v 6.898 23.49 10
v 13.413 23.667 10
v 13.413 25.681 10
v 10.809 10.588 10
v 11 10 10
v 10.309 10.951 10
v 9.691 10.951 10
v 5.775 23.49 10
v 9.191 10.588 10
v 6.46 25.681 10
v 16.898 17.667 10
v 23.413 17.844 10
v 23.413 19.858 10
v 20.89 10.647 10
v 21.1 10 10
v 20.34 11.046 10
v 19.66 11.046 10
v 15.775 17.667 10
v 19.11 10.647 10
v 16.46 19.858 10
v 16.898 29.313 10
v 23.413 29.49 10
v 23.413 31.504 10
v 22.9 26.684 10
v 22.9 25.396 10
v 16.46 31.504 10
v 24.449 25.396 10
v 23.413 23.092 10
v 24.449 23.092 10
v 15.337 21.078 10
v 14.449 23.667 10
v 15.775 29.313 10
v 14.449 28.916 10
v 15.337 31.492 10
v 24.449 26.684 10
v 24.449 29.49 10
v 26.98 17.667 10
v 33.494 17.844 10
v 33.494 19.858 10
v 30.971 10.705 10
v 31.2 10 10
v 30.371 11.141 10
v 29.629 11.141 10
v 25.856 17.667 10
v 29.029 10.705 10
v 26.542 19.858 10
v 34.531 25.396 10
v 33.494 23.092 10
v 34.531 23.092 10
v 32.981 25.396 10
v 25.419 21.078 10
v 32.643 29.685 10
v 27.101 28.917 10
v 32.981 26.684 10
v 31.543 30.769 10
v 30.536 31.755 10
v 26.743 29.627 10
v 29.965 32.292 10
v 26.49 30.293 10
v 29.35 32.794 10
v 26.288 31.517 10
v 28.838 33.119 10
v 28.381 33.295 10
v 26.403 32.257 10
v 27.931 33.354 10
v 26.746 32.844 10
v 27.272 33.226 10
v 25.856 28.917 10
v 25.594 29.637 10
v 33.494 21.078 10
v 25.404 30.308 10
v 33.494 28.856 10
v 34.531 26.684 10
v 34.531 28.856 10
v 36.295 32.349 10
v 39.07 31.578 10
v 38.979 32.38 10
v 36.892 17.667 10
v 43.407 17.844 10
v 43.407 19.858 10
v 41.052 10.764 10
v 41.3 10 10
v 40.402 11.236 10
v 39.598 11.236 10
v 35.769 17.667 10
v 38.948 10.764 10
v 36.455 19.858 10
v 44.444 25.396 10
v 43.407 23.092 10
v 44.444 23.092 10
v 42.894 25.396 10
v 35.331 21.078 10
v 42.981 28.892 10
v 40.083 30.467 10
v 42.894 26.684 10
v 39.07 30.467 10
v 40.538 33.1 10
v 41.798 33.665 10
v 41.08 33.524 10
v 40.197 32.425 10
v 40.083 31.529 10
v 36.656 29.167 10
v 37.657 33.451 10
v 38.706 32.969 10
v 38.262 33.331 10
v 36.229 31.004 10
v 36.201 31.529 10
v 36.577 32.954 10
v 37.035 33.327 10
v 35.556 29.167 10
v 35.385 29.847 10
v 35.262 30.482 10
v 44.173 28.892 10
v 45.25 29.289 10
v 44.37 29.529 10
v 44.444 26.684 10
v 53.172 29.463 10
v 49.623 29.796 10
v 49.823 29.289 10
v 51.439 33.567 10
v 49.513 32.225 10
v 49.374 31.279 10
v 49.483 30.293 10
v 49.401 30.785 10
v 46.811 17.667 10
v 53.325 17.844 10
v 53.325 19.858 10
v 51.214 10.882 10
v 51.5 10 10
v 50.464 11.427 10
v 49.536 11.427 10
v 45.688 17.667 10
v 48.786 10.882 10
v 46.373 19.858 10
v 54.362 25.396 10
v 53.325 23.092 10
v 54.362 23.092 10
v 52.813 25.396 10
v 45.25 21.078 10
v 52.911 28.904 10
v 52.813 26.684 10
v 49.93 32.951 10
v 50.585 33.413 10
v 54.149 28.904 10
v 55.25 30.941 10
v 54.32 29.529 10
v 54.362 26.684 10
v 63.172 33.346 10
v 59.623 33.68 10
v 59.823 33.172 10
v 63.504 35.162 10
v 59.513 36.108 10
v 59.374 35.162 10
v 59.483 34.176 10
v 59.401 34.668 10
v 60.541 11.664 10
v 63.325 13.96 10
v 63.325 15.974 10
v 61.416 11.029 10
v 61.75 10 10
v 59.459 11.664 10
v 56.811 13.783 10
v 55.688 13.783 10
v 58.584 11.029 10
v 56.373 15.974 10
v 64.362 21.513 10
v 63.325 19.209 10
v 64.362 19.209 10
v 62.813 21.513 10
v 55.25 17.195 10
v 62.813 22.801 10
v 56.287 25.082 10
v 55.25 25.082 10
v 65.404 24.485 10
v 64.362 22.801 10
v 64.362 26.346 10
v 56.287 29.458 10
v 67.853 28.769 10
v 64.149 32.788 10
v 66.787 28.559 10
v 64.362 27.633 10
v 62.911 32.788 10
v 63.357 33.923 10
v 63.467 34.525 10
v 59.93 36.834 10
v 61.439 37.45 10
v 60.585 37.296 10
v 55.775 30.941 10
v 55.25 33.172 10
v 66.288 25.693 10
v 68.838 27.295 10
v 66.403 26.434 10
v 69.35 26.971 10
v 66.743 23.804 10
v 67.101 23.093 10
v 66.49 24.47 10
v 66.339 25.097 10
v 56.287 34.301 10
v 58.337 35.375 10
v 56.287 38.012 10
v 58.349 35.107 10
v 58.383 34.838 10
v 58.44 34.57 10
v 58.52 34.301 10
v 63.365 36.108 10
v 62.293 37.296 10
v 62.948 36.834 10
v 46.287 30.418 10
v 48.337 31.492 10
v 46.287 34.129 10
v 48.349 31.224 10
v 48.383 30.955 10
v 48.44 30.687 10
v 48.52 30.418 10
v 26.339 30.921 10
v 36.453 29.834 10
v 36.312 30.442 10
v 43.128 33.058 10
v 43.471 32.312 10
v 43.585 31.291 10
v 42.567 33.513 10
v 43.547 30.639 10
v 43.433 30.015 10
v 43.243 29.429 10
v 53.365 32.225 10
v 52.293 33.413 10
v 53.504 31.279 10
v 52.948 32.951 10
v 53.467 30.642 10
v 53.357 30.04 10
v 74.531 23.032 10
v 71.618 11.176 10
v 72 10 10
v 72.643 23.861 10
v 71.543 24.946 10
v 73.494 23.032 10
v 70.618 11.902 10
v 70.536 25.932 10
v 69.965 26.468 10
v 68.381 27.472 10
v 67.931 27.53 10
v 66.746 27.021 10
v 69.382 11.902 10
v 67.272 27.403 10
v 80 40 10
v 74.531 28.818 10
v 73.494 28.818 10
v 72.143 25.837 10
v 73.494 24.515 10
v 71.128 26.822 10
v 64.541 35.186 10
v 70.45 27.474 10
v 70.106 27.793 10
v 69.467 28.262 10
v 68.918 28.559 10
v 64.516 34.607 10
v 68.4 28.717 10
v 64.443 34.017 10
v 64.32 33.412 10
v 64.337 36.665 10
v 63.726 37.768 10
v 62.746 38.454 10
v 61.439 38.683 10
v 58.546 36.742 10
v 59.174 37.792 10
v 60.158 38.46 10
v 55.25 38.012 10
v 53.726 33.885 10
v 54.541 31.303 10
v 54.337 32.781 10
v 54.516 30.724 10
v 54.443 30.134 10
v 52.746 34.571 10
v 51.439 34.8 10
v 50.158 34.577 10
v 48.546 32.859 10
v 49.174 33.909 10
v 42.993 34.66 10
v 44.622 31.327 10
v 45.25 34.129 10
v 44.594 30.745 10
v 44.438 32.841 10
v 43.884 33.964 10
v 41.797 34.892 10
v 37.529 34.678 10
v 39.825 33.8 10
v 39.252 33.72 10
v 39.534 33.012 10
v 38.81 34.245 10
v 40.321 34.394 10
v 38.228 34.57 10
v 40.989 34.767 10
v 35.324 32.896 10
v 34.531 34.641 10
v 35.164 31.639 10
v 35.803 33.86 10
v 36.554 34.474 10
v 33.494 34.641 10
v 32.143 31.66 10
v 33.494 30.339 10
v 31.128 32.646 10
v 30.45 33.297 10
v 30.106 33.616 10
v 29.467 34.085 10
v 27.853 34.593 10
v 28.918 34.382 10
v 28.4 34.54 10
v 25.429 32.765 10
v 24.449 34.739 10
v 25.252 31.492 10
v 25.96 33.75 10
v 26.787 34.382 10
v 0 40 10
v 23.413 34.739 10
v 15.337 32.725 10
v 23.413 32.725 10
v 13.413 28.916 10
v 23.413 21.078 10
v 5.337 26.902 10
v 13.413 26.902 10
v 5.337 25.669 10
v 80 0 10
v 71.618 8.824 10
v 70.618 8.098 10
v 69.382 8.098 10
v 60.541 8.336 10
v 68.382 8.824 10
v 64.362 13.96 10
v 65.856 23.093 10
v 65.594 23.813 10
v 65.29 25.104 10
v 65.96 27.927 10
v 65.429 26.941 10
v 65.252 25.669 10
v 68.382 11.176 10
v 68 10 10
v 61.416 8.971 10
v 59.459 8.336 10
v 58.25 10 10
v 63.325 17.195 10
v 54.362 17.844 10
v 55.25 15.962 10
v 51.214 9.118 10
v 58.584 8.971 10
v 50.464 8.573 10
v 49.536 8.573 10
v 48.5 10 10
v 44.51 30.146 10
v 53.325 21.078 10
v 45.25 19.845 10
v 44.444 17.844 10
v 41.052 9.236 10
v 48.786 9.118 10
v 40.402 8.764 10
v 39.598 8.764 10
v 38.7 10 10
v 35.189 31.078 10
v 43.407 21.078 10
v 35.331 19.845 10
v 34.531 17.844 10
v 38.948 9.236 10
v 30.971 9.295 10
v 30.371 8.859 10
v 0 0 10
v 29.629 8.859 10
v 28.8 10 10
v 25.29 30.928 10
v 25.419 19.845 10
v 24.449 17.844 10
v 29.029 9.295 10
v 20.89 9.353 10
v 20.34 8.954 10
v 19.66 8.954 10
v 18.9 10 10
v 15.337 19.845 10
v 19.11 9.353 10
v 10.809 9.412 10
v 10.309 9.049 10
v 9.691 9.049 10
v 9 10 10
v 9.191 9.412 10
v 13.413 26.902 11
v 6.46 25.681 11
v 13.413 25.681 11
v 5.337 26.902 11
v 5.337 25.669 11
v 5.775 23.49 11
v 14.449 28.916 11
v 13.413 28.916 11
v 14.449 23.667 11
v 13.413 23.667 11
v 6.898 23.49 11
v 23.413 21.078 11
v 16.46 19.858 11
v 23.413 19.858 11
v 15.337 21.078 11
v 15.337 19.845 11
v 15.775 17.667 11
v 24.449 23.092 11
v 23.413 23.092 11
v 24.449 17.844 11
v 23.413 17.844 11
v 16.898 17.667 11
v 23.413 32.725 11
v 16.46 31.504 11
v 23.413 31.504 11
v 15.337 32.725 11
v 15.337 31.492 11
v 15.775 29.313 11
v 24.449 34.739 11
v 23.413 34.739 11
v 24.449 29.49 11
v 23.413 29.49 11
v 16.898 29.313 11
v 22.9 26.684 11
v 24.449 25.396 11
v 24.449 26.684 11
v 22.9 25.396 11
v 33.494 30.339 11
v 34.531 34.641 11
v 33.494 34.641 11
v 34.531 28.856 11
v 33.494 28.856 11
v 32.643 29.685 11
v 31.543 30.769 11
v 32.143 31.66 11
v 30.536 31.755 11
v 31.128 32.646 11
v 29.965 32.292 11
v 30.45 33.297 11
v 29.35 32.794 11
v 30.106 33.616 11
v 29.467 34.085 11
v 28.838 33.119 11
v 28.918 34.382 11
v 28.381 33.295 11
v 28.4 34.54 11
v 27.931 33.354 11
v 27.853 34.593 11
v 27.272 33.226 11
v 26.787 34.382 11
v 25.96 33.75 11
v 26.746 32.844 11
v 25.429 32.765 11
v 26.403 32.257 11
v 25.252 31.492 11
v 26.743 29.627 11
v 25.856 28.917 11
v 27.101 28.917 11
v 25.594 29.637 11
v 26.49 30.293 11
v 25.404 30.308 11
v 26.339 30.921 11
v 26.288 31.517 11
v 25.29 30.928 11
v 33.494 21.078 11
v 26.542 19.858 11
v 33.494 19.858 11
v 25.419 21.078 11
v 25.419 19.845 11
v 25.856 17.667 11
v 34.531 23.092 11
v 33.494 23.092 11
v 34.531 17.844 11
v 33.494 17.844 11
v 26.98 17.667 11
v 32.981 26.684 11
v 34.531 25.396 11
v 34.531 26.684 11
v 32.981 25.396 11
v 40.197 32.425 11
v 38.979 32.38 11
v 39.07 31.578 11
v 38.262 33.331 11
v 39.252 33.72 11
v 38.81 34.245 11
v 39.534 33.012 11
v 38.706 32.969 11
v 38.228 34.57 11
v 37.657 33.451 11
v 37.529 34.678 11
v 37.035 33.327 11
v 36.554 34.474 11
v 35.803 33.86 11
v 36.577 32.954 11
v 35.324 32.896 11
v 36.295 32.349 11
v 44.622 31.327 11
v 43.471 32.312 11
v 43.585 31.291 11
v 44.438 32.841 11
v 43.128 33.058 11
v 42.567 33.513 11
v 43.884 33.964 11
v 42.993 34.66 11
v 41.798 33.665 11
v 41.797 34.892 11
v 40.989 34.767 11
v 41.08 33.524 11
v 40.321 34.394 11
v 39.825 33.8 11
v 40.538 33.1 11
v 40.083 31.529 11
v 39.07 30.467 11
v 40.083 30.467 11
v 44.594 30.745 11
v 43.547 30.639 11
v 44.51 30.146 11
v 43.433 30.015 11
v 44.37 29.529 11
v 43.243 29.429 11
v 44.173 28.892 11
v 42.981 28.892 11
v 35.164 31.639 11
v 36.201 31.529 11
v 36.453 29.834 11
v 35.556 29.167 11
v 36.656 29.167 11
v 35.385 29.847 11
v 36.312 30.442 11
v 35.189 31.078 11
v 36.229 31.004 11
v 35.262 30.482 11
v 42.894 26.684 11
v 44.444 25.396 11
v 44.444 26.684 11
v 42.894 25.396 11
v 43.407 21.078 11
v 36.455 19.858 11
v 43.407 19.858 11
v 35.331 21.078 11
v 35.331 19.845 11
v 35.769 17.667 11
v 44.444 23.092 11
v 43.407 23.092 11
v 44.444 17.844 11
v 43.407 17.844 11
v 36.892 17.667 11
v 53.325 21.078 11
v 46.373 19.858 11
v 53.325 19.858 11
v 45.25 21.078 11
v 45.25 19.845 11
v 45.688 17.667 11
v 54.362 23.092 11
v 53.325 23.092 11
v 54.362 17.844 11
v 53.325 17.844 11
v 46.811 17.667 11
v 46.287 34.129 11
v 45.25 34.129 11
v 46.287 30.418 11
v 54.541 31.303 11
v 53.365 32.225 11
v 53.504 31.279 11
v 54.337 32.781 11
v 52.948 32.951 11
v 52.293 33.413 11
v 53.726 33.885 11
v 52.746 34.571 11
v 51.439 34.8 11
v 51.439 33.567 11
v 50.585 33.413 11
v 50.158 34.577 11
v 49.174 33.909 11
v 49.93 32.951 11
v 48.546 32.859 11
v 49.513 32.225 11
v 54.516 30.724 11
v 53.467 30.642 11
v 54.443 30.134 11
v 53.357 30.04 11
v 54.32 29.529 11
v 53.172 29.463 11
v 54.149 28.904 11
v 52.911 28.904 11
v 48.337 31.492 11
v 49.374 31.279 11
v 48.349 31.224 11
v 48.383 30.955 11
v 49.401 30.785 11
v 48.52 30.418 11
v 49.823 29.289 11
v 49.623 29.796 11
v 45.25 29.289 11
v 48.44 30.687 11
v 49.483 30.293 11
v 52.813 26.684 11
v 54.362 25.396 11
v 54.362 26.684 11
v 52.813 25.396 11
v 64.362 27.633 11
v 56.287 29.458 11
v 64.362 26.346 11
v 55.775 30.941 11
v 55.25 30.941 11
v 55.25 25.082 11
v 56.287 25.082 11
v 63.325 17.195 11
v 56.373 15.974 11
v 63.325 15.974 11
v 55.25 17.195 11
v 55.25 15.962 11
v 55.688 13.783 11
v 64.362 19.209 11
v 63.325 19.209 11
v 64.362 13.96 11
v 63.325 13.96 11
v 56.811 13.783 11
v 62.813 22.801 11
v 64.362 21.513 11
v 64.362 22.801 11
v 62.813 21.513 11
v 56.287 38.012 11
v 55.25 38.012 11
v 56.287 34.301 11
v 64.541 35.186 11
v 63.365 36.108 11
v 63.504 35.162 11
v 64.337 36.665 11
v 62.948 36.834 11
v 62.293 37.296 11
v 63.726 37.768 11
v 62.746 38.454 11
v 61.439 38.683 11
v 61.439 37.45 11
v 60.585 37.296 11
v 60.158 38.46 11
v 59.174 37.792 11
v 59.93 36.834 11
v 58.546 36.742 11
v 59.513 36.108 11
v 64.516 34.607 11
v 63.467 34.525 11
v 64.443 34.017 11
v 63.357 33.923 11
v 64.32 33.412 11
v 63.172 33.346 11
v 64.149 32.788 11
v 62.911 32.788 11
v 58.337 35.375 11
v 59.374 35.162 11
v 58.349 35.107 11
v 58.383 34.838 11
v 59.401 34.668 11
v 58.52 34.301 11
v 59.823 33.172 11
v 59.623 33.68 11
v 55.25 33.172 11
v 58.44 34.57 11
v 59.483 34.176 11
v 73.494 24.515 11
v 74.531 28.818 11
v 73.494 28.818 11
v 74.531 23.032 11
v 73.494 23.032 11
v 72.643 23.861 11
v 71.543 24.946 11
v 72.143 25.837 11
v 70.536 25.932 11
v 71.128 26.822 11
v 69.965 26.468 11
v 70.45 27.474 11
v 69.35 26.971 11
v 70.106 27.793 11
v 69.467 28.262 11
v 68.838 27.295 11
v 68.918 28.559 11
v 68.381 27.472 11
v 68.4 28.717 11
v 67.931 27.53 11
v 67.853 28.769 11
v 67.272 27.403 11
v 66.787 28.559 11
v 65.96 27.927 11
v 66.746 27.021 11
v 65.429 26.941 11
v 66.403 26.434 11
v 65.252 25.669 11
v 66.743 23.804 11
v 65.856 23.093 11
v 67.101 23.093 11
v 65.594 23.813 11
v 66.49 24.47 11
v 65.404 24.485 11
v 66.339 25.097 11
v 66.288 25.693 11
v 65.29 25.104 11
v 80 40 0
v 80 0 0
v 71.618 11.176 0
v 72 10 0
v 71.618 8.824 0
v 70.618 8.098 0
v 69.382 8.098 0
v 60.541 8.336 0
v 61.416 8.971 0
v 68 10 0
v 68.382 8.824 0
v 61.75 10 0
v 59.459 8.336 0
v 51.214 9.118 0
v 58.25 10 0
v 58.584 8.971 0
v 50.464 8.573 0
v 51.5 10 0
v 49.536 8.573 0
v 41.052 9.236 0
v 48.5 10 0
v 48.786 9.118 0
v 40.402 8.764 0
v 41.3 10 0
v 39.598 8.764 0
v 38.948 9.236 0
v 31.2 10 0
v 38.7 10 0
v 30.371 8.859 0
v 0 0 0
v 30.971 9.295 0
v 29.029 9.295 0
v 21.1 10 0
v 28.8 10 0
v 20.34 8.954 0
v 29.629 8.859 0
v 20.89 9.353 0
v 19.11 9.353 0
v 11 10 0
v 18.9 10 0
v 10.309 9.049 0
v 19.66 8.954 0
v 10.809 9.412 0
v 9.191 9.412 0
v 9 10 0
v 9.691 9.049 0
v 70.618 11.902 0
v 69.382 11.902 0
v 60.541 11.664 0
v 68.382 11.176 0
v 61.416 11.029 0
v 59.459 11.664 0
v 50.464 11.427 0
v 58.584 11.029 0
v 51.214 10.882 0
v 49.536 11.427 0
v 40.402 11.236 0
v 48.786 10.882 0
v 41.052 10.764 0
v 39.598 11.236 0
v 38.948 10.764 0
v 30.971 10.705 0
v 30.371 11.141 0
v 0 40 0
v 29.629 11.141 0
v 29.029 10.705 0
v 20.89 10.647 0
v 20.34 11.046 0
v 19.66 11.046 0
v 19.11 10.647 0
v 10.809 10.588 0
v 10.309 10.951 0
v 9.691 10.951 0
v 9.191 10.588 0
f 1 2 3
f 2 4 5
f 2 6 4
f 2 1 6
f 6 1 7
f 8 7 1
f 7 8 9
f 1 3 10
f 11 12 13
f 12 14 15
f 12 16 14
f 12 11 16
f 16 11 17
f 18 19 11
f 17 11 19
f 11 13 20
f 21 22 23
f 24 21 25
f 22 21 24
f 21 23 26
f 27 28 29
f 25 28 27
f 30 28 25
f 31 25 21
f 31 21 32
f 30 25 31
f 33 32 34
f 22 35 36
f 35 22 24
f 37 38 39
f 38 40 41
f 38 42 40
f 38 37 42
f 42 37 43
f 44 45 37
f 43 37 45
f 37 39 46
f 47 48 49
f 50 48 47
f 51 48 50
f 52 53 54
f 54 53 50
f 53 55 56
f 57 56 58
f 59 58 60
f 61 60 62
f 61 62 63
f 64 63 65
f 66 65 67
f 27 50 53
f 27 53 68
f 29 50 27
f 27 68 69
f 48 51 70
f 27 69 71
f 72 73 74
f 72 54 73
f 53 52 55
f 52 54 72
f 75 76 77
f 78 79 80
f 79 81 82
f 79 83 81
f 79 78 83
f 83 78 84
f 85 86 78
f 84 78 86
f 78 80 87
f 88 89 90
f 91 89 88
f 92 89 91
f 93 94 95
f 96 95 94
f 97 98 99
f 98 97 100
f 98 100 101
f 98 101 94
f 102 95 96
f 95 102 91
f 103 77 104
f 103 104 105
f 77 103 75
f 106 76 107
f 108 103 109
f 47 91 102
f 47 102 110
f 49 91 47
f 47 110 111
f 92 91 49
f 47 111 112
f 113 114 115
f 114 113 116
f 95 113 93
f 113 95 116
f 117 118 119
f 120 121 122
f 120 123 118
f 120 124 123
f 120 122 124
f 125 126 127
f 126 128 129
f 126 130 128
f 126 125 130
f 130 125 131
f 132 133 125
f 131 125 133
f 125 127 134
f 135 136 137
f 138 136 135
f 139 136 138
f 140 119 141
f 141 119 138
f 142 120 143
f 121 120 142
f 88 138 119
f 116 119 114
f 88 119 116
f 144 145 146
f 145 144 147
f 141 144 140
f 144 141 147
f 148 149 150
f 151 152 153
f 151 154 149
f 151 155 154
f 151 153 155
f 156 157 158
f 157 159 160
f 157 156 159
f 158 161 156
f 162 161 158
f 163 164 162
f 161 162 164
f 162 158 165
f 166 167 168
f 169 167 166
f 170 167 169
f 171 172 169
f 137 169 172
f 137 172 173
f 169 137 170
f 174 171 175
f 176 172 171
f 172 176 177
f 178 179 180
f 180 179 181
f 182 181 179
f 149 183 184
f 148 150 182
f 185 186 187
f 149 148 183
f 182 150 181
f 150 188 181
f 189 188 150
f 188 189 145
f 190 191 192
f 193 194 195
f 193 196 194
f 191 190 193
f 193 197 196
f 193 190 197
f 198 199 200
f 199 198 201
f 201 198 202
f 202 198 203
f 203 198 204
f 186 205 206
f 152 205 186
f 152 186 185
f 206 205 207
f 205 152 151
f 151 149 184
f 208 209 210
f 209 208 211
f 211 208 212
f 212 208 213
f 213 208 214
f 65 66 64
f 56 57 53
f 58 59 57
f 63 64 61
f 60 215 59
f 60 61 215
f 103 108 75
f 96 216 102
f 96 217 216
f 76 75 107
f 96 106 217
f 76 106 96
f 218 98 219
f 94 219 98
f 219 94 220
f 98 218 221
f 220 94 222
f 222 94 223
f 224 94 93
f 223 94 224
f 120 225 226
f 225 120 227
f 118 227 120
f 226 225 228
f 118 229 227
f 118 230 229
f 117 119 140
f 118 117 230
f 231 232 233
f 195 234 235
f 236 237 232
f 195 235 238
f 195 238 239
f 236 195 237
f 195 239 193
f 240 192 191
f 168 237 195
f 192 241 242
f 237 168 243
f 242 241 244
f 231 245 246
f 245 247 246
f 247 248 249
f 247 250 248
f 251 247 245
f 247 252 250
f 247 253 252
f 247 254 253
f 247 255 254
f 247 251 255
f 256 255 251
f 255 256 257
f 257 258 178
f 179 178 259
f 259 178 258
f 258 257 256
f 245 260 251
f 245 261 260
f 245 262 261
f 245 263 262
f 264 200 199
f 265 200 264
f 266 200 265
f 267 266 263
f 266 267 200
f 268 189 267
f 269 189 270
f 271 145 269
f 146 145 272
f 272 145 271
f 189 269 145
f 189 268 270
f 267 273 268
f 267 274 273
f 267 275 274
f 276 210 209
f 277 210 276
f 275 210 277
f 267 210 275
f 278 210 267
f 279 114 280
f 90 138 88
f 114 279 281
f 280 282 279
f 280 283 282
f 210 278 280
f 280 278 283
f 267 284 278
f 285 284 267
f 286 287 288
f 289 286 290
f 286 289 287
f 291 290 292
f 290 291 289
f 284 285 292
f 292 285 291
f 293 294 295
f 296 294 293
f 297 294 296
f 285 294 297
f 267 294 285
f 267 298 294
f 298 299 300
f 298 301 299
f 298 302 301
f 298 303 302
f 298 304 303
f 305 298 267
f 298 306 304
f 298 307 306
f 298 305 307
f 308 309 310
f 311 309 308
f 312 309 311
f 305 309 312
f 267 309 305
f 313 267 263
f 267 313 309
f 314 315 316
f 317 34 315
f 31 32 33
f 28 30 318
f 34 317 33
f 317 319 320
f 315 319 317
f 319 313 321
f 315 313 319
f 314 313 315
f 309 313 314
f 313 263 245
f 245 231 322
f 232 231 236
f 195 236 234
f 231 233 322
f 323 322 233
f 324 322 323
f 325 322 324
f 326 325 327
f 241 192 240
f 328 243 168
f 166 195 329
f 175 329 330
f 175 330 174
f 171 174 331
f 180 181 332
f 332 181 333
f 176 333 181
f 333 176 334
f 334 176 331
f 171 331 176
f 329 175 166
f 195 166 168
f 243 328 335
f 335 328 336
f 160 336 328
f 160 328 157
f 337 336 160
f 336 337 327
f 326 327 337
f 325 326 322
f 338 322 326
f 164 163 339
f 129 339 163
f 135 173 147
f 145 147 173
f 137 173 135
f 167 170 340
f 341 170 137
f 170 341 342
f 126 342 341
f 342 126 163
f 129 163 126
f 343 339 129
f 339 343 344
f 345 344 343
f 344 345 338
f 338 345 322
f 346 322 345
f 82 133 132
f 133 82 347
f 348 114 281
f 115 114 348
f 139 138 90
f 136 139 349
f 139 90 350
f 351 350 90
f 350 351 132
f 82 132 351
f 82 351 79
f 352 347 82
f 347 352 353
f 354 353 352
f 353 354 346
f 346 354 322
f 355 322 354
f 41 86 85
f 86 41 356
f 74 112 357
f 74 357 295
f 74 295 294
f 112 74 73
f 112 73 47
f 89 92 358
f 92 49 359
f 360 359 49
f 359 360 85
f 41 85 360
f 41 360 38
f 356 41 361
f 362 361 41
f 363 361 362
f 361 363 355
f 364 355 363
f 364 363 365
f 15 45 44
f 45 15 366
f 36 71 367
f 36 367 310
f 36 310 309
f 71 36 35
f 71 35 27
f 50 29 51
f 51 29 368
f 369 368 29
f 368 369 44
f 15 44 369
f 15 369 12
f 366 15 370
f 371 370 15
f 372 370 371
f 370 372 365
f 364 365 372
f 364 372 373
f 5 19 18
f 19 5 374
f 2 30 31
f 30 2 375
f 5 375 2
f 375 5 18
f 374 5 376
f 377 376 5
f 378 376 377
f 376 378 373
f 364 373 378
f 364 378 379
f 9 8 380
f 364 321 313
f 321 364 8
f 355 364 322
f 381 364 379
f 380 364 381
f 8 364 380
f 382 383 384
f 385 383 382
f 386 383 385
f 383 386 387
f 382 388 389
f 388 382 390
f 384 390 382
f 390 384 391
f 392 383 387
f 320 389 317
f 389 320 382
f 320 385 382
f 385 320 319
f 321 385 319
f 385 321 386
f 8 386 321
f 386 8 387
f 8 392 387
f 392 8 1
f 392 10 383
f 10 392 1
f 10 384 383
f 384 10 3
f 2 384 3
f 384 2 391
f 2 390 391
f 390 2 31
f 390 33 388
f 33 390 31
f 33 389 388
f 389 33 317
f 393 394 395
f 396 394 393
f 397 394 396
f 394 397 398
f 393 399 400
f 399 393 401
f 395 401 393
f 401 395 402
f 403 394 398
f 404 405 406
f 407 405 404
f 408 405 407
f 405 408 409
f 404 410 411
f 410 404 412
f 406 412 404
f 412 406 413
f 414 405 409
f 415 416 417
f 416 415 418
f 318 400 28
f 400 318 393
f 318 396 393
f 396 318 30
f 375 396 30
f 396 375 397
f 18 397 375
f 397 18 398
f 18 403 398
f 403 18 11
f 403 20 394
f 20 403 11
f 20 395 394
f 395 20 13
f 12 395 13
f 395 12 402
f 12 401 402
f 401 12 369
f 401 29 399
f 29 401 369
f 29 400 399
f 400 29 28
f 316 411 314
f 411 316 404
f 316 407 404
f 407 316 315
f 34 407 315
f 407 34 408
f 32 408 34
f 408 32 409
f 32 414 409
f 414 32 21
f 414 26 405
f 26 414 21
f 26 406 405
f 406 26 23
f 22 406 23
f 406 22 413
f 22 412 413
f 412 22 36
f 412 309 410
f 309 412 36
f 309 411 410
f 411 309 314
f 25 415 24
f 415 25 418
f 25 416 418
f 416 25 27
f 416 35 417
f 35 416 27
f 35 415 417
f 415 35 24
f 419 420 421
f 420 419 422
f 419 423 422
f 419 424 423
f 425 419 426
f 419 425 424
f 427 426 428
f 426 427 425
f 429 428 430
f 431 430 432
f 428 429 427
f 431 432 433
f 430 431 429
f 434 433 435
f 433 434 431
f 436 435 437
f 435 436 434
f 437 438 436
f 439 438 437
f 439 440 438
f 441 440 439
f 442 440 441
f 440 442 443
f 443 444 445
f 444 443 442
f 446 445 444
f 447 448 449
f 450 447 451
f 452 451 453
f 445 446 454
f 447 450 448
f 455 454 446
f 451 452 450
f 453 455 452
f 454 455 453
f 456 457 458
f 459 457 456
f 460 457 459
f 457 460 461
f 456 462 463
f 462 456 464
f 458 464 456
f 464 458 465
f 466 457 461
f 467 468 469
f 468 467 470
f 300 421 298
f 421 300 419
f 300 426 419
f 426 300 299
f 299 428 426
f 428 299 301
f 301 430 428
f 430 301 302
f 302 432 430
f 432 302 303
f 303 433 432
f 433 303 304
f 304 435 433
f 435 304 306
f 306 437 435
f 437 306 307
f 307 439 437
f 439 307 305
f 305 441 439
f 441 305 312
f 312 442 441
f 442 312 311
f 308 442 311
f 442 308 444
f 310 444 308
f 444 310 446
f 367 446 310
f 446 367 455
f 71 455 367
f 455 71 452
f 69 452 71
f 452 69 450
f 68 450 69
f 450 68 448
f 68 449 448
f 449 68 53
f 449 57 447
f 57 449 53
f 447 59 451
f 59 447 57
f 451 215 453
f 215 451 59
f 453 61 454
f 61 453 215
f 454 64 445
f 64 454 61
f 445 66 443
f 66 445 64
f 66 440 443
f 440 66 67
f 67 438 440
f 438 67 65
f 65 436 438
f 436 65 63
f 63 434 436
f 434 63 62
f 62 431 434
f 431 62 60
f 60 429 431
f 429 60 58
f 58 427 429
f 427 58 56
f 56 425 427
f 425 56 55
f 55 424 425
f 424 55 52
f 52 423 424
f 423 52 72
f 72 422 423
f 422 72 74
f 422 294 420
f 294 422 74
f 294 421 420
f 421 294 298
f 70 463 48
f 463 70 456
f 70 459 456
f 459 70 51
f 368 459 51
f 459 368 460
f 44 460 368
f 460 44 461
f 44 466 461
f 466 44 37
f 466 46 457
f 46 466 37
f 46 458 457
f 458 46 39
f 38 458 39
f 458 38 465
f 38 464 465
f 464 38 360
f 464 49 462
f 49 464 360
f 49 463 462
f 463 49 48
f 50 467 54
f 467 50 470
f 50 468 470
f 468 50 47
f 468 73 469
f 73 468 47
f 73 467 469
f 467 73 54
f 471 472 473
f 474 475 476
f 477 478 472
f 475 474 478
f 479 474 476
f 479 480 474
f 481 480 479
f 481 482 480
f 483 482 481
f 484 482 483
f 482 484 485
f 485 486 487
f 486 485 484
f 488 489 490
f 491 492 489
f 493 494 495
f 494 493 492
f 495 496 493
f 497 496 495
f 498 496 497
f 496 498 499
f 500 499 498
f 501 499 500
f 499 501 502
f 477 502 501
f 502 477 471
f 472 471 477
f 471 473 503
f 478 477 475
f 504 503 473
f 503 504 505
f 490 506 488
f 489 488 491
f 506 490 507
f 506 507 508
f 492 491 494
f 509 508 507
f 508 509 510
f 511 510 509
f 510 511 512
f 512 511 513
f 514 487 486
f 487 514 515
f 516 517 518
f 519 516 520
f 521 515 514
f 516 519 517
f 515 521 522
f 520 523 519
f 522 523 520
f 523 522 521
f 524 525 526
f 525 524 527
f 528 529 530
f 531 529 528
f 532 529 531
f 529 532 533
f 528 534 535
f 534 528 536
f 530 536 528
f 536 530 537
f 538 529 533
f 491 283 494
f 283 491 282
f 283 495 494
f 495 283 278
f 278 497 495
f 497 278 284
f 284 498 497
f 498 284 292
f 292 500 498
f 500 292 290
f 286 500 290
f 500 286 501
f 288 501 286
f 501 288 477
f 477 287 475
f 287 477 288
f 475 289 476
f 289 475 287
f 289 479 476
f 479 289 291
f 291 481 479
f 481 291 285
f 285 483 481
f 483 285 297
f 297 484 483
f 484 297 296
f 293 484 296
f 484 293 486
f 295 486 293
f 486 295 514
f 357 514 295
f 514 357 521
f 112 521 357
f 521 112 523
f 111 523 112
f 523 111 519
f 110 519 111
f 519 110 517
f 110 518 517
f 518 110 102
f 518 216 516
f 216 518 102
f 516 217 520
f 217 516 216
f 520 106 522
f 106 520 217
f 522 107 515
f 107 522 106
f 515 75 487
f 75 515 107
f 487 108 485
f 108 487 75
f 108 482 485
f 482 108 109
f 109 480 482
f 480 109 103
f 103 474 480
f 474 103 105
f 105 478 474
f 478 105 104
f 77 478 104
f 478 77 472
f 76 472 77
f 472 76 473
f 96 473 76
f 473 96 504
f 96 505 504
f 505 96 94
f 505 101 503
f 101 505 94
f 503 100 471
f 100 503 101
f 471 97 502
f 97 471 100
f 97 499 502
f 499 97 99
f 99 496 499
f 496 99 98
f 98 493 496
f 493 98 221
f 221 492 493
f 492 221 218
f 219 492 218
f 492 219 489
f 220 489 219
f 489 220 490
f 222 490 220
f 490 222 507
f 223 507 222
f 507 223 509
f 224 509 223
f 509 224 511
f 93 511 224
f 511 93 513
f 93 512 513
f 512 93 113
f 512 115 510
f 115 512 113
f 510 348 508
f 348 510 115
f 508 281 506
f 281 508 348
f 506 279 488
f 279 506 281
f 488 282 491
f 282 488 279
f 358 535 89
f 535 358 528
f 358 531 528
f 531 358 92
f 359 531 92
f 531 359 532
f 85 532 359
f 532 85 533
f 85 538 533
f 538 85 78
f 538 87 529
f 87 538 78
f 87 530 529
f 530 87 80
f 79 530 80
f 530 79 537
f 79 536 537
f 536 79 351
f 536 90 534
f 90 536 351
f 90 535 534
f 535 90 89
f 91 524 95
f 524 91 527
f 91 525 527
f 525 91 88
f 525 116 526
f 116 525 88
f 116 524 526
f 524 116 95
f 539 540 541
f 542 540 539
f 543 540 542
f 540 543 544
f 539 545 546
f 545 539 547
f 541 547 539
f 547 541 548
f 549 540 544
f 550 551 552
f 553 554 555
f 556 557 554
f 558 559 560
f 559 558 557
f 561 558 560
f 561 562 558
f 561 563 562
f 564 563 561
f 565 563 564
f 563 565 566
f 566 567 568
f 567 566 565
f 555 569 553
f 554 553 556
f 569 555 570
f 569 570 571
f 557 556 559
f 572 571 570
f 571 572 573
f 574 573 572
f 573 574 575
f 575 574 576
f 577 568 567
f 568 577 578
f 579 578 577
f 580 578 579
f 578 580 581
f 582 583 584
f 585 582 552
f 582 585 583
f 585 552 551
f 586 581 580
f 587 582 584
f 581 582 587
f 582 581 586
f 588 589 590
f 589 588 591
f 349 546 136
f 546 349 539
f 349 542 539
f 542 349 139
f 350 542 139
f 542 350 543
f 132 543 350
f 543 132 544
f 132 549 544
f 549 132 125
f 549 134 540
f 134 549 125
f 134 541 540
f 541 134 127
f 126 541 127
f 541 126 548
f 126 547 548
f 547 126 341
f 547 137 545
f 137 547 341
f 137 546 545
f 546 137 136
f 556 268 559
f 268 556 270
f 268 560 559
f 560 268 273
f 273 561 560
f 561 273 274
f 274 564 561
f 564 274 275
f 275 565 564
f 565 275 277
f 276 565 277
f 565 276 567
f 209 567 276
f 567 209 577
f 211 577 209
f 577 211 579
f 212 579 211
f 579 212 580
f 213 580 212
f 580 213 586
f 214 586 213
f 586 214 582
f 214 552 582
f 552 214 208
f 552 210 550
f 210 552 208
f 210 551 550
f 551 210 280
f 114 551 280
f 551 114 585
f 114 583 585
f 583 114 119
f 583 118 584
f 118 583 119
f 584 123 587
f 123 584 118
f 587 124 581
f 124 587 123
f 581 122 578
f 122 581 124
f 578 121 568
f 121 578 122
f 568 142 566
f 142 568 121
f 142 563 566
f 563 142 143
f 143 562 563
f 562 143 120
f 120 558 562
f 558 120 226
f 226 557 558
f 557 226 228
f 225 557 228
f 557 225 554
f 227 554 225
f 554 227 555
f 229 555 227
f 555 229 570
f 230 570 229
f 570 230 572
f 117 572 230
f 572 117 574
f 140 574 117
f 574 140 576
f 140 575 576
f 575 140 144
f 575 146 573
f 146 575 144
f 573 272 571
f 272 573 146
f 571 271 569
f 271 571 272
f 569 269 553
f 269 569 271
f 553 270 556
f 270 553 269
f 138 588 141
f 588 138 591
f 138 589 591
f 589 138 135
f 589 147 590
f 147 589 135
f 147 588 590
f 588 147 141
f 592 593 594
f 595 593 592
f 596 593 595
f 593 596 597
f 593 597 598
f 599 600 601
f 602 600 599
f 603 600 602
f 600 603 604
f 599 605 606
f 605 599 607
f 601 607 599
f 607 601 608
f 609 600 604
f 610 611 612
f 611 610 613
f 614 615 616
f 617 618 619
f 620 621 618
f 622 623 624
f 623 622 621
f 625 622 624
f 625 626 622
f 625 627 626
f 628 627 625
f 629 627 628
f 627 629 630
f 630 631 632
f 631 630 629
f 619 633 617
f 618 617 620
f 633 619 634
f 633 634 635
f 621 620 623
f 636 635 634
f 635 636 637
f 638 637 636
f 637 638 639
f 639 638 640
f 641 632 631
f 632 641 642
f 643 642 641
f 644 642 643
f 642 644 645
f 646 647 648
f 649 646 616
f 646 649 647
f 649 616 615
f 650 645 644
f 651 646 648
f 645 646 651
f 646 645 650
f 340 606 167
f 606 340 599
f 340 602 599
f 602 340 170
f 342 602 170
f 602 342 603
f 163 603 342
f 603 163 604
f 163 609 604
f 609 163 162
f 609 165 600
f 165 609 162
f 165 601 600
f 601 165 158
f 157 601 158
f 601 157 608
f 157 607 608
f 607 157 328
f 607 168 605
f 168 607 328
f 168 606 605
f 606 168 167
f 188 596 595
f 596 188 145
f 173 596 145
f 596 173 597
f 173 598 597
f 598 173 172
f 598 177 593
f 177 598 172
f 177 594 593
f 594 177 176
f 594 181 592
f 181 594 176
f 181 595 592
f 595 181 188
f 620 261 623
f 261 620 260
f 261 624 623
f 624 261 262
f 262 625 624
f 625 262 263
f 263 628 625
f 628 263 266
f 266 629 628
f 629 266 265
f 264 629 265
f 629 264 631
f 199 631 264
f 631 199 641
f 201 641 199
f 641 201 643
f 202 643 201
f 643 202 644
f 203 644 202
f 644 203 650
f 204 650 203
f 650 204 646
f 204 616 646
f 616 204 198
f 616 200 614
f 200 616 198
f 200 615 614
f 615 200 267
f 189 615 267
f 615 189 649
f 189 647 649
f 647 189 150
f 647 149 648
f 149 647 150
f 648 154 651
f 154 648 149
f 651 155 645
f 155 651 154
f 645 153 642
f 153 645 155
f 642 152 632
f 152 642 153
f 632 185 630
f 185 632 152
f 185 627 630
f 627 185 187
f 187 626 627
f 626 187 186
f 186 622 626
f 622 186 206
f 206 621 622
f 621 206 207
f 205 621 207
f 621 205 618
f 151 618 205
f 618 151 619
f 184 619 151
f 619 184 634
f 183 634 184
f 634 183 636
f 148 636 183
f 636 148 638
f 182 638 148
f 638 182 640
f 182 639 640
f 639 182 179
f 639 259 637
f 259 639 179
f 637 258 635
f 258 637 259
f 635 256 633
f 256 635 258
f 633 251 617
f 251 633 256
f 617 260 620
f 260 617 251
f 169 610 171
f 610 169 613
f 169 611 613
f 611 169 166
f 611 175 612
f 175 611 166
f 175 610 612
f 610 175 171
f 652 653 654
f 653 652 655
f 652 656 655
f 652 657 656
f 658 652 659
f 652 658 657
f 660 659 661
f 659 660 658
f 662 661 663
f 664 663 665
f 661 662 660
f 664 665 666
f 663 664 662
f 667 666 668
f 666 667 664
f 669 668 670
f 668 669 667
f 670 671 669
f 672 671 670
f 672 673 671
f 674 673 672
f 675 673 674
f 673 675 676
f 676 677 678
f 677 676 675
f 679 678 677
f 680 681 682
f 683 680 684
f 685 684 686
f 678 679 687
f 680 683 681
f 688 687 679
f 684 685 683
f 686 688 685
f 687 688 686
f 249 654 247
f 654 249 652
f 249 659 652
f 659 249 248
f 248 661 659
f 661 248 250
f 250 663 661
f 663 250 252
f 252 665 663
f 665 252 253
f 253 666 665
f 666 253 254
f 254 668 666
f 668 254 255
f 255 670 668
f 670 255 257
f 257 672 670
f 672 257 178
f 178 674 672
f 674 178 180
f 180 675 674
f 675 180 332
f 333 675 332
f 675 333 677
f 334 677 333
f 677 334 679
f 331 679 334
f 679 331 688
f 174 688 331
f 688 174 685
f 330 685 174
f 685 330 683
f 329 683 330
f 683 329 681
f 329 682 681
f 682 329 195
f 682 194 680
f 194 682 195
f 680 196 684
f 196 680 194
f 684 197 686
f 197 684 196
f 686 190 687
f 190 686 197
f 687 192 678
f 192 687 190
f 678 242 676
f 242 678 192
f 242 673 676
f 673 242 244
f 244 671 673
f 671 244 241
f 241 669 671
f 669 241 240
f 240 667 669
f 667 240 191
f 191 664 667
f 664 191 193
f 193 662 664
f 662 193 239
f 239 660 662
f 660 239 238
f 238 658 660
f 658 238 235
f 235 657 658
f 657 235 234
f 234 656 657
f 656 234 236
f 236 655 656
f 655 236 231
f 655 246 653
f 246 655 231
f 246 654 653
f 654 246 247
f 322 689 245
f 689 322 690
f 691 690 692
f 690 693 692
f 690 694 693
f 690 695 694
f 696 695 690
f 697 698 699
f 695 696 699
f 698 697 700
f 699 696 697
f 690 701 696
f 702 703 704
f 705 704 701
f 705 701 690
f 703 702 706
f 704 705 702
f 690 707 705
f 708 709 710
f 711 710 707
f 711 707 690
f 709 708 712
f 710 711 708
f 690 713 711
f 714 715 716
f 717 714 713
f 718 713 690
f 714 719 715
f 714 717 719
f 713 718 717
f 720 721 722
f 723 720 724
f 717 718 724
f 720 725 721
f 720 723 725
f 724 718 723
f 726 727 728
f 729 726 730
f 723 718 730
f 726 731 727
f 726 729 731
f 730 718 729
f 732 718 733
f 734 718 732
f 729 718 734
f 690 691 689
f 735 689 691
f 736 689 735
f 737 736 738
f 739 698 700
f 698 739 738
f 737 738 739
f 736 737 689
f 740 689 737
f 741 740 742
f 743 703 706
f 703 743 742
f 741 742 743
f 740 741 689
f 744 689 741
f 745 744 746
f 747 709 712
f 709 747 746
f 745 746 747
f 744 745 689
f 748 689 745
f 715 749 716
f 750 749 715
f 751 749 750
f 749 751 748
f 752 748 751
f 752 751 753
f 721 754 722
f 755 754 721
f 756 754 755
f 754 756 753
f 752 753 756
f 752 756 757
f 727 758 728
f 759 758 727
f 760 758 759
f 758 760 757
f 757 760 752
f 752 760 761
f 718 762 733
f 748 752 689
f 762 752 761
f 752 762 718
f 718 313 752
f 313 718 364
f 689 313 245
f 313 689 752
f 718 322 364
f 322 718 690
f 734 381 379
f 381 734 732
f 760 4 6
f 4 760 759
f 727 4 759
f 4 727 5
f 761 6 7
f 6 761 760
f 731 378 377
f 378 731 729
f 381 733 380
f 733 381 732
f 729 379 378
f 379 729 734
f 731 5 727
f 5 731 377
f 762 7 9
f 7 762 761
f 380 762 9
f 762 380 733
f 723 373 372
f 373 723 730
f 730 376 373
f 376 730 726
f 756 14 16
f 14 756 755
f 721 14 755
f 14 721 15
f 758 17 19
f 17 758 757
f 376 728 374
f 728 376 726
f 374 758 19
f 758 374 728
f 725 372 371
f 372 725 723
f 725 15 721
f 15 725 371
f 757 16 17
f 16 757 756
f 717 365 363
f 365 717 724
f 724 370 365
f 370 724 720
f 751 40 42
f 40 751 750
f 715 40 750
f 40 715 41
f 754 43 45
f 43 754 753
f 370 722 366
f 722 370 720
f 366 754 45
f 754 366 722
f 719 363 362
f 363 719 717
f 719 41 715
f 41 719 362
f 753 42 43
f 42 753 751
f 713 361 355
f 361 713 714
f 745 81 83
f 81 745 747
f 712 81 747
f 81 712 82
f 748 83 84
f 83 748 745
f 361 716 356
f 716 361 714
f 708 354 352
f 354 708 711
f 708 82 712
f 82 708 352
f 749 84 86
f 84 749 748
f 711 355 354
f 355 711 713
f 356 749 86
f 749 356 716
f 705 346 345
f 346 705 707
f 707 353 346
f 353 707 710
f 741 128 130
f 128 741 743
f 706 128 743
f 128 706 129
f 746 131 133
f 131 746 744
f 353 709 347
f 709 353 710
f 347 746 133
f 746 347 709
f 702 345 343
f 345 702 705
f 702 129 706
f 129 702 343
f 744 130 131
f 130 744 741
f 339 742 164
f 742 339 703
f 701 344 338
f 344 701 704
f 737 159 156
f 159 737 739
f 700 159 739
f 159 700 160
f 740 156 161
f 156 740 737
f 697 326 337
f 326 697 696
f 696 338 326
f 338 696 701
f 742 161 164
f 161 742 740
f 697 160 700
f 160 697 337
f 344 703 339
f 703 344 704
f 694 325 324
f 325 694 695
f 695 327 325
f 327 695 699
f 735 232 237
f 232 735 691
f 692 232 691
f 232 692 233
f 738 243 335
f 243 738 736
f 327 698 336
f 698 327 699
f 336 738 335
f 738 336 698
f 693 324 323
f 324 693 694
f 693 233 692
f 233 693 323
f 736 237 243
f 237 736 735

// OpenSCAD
$fn=10;

rList =
		[
			1.0, 1.1, 1.2, 1.3, 1.5, 1.75, 2.0
//			2.0, 2.5, 3.0, 3.5, 4.0, 4.5, 5.0
		];

h = 10;
w = 40;

difference()
{
	union()
	{
		color("green")
			cube([10 * (len(rList) + 1), w, h], false);

		for (i = [0 : (len(rList) - 1)])
		{
			x = (i + 1) * 10;
			r = rList[i];
			echo(str("Printing ", i, " width = ", r));
			createLabel(x, r);
		}
	}
	for (i = [0 : (len(rList) - 1)])
	{
		x = 10 + i * 10;
		r = rList[i];
		createHole(x, r);
	}
}

	module createHole(x, radius)
	{
		translate([x, w * 0.25, -0.1])
			cylinder(h * 1.1, radius, radius);
	}

	module createLabel(x, radius)
	{
		translate([x, w * 0.65, h])
			linear_extrude(height=1, convexity=4)
			{
				rotate([0, 0, 90])
					text(str(radius), size=9, font="OpenSymbol", halign="center", valign="center");
			};
	}
